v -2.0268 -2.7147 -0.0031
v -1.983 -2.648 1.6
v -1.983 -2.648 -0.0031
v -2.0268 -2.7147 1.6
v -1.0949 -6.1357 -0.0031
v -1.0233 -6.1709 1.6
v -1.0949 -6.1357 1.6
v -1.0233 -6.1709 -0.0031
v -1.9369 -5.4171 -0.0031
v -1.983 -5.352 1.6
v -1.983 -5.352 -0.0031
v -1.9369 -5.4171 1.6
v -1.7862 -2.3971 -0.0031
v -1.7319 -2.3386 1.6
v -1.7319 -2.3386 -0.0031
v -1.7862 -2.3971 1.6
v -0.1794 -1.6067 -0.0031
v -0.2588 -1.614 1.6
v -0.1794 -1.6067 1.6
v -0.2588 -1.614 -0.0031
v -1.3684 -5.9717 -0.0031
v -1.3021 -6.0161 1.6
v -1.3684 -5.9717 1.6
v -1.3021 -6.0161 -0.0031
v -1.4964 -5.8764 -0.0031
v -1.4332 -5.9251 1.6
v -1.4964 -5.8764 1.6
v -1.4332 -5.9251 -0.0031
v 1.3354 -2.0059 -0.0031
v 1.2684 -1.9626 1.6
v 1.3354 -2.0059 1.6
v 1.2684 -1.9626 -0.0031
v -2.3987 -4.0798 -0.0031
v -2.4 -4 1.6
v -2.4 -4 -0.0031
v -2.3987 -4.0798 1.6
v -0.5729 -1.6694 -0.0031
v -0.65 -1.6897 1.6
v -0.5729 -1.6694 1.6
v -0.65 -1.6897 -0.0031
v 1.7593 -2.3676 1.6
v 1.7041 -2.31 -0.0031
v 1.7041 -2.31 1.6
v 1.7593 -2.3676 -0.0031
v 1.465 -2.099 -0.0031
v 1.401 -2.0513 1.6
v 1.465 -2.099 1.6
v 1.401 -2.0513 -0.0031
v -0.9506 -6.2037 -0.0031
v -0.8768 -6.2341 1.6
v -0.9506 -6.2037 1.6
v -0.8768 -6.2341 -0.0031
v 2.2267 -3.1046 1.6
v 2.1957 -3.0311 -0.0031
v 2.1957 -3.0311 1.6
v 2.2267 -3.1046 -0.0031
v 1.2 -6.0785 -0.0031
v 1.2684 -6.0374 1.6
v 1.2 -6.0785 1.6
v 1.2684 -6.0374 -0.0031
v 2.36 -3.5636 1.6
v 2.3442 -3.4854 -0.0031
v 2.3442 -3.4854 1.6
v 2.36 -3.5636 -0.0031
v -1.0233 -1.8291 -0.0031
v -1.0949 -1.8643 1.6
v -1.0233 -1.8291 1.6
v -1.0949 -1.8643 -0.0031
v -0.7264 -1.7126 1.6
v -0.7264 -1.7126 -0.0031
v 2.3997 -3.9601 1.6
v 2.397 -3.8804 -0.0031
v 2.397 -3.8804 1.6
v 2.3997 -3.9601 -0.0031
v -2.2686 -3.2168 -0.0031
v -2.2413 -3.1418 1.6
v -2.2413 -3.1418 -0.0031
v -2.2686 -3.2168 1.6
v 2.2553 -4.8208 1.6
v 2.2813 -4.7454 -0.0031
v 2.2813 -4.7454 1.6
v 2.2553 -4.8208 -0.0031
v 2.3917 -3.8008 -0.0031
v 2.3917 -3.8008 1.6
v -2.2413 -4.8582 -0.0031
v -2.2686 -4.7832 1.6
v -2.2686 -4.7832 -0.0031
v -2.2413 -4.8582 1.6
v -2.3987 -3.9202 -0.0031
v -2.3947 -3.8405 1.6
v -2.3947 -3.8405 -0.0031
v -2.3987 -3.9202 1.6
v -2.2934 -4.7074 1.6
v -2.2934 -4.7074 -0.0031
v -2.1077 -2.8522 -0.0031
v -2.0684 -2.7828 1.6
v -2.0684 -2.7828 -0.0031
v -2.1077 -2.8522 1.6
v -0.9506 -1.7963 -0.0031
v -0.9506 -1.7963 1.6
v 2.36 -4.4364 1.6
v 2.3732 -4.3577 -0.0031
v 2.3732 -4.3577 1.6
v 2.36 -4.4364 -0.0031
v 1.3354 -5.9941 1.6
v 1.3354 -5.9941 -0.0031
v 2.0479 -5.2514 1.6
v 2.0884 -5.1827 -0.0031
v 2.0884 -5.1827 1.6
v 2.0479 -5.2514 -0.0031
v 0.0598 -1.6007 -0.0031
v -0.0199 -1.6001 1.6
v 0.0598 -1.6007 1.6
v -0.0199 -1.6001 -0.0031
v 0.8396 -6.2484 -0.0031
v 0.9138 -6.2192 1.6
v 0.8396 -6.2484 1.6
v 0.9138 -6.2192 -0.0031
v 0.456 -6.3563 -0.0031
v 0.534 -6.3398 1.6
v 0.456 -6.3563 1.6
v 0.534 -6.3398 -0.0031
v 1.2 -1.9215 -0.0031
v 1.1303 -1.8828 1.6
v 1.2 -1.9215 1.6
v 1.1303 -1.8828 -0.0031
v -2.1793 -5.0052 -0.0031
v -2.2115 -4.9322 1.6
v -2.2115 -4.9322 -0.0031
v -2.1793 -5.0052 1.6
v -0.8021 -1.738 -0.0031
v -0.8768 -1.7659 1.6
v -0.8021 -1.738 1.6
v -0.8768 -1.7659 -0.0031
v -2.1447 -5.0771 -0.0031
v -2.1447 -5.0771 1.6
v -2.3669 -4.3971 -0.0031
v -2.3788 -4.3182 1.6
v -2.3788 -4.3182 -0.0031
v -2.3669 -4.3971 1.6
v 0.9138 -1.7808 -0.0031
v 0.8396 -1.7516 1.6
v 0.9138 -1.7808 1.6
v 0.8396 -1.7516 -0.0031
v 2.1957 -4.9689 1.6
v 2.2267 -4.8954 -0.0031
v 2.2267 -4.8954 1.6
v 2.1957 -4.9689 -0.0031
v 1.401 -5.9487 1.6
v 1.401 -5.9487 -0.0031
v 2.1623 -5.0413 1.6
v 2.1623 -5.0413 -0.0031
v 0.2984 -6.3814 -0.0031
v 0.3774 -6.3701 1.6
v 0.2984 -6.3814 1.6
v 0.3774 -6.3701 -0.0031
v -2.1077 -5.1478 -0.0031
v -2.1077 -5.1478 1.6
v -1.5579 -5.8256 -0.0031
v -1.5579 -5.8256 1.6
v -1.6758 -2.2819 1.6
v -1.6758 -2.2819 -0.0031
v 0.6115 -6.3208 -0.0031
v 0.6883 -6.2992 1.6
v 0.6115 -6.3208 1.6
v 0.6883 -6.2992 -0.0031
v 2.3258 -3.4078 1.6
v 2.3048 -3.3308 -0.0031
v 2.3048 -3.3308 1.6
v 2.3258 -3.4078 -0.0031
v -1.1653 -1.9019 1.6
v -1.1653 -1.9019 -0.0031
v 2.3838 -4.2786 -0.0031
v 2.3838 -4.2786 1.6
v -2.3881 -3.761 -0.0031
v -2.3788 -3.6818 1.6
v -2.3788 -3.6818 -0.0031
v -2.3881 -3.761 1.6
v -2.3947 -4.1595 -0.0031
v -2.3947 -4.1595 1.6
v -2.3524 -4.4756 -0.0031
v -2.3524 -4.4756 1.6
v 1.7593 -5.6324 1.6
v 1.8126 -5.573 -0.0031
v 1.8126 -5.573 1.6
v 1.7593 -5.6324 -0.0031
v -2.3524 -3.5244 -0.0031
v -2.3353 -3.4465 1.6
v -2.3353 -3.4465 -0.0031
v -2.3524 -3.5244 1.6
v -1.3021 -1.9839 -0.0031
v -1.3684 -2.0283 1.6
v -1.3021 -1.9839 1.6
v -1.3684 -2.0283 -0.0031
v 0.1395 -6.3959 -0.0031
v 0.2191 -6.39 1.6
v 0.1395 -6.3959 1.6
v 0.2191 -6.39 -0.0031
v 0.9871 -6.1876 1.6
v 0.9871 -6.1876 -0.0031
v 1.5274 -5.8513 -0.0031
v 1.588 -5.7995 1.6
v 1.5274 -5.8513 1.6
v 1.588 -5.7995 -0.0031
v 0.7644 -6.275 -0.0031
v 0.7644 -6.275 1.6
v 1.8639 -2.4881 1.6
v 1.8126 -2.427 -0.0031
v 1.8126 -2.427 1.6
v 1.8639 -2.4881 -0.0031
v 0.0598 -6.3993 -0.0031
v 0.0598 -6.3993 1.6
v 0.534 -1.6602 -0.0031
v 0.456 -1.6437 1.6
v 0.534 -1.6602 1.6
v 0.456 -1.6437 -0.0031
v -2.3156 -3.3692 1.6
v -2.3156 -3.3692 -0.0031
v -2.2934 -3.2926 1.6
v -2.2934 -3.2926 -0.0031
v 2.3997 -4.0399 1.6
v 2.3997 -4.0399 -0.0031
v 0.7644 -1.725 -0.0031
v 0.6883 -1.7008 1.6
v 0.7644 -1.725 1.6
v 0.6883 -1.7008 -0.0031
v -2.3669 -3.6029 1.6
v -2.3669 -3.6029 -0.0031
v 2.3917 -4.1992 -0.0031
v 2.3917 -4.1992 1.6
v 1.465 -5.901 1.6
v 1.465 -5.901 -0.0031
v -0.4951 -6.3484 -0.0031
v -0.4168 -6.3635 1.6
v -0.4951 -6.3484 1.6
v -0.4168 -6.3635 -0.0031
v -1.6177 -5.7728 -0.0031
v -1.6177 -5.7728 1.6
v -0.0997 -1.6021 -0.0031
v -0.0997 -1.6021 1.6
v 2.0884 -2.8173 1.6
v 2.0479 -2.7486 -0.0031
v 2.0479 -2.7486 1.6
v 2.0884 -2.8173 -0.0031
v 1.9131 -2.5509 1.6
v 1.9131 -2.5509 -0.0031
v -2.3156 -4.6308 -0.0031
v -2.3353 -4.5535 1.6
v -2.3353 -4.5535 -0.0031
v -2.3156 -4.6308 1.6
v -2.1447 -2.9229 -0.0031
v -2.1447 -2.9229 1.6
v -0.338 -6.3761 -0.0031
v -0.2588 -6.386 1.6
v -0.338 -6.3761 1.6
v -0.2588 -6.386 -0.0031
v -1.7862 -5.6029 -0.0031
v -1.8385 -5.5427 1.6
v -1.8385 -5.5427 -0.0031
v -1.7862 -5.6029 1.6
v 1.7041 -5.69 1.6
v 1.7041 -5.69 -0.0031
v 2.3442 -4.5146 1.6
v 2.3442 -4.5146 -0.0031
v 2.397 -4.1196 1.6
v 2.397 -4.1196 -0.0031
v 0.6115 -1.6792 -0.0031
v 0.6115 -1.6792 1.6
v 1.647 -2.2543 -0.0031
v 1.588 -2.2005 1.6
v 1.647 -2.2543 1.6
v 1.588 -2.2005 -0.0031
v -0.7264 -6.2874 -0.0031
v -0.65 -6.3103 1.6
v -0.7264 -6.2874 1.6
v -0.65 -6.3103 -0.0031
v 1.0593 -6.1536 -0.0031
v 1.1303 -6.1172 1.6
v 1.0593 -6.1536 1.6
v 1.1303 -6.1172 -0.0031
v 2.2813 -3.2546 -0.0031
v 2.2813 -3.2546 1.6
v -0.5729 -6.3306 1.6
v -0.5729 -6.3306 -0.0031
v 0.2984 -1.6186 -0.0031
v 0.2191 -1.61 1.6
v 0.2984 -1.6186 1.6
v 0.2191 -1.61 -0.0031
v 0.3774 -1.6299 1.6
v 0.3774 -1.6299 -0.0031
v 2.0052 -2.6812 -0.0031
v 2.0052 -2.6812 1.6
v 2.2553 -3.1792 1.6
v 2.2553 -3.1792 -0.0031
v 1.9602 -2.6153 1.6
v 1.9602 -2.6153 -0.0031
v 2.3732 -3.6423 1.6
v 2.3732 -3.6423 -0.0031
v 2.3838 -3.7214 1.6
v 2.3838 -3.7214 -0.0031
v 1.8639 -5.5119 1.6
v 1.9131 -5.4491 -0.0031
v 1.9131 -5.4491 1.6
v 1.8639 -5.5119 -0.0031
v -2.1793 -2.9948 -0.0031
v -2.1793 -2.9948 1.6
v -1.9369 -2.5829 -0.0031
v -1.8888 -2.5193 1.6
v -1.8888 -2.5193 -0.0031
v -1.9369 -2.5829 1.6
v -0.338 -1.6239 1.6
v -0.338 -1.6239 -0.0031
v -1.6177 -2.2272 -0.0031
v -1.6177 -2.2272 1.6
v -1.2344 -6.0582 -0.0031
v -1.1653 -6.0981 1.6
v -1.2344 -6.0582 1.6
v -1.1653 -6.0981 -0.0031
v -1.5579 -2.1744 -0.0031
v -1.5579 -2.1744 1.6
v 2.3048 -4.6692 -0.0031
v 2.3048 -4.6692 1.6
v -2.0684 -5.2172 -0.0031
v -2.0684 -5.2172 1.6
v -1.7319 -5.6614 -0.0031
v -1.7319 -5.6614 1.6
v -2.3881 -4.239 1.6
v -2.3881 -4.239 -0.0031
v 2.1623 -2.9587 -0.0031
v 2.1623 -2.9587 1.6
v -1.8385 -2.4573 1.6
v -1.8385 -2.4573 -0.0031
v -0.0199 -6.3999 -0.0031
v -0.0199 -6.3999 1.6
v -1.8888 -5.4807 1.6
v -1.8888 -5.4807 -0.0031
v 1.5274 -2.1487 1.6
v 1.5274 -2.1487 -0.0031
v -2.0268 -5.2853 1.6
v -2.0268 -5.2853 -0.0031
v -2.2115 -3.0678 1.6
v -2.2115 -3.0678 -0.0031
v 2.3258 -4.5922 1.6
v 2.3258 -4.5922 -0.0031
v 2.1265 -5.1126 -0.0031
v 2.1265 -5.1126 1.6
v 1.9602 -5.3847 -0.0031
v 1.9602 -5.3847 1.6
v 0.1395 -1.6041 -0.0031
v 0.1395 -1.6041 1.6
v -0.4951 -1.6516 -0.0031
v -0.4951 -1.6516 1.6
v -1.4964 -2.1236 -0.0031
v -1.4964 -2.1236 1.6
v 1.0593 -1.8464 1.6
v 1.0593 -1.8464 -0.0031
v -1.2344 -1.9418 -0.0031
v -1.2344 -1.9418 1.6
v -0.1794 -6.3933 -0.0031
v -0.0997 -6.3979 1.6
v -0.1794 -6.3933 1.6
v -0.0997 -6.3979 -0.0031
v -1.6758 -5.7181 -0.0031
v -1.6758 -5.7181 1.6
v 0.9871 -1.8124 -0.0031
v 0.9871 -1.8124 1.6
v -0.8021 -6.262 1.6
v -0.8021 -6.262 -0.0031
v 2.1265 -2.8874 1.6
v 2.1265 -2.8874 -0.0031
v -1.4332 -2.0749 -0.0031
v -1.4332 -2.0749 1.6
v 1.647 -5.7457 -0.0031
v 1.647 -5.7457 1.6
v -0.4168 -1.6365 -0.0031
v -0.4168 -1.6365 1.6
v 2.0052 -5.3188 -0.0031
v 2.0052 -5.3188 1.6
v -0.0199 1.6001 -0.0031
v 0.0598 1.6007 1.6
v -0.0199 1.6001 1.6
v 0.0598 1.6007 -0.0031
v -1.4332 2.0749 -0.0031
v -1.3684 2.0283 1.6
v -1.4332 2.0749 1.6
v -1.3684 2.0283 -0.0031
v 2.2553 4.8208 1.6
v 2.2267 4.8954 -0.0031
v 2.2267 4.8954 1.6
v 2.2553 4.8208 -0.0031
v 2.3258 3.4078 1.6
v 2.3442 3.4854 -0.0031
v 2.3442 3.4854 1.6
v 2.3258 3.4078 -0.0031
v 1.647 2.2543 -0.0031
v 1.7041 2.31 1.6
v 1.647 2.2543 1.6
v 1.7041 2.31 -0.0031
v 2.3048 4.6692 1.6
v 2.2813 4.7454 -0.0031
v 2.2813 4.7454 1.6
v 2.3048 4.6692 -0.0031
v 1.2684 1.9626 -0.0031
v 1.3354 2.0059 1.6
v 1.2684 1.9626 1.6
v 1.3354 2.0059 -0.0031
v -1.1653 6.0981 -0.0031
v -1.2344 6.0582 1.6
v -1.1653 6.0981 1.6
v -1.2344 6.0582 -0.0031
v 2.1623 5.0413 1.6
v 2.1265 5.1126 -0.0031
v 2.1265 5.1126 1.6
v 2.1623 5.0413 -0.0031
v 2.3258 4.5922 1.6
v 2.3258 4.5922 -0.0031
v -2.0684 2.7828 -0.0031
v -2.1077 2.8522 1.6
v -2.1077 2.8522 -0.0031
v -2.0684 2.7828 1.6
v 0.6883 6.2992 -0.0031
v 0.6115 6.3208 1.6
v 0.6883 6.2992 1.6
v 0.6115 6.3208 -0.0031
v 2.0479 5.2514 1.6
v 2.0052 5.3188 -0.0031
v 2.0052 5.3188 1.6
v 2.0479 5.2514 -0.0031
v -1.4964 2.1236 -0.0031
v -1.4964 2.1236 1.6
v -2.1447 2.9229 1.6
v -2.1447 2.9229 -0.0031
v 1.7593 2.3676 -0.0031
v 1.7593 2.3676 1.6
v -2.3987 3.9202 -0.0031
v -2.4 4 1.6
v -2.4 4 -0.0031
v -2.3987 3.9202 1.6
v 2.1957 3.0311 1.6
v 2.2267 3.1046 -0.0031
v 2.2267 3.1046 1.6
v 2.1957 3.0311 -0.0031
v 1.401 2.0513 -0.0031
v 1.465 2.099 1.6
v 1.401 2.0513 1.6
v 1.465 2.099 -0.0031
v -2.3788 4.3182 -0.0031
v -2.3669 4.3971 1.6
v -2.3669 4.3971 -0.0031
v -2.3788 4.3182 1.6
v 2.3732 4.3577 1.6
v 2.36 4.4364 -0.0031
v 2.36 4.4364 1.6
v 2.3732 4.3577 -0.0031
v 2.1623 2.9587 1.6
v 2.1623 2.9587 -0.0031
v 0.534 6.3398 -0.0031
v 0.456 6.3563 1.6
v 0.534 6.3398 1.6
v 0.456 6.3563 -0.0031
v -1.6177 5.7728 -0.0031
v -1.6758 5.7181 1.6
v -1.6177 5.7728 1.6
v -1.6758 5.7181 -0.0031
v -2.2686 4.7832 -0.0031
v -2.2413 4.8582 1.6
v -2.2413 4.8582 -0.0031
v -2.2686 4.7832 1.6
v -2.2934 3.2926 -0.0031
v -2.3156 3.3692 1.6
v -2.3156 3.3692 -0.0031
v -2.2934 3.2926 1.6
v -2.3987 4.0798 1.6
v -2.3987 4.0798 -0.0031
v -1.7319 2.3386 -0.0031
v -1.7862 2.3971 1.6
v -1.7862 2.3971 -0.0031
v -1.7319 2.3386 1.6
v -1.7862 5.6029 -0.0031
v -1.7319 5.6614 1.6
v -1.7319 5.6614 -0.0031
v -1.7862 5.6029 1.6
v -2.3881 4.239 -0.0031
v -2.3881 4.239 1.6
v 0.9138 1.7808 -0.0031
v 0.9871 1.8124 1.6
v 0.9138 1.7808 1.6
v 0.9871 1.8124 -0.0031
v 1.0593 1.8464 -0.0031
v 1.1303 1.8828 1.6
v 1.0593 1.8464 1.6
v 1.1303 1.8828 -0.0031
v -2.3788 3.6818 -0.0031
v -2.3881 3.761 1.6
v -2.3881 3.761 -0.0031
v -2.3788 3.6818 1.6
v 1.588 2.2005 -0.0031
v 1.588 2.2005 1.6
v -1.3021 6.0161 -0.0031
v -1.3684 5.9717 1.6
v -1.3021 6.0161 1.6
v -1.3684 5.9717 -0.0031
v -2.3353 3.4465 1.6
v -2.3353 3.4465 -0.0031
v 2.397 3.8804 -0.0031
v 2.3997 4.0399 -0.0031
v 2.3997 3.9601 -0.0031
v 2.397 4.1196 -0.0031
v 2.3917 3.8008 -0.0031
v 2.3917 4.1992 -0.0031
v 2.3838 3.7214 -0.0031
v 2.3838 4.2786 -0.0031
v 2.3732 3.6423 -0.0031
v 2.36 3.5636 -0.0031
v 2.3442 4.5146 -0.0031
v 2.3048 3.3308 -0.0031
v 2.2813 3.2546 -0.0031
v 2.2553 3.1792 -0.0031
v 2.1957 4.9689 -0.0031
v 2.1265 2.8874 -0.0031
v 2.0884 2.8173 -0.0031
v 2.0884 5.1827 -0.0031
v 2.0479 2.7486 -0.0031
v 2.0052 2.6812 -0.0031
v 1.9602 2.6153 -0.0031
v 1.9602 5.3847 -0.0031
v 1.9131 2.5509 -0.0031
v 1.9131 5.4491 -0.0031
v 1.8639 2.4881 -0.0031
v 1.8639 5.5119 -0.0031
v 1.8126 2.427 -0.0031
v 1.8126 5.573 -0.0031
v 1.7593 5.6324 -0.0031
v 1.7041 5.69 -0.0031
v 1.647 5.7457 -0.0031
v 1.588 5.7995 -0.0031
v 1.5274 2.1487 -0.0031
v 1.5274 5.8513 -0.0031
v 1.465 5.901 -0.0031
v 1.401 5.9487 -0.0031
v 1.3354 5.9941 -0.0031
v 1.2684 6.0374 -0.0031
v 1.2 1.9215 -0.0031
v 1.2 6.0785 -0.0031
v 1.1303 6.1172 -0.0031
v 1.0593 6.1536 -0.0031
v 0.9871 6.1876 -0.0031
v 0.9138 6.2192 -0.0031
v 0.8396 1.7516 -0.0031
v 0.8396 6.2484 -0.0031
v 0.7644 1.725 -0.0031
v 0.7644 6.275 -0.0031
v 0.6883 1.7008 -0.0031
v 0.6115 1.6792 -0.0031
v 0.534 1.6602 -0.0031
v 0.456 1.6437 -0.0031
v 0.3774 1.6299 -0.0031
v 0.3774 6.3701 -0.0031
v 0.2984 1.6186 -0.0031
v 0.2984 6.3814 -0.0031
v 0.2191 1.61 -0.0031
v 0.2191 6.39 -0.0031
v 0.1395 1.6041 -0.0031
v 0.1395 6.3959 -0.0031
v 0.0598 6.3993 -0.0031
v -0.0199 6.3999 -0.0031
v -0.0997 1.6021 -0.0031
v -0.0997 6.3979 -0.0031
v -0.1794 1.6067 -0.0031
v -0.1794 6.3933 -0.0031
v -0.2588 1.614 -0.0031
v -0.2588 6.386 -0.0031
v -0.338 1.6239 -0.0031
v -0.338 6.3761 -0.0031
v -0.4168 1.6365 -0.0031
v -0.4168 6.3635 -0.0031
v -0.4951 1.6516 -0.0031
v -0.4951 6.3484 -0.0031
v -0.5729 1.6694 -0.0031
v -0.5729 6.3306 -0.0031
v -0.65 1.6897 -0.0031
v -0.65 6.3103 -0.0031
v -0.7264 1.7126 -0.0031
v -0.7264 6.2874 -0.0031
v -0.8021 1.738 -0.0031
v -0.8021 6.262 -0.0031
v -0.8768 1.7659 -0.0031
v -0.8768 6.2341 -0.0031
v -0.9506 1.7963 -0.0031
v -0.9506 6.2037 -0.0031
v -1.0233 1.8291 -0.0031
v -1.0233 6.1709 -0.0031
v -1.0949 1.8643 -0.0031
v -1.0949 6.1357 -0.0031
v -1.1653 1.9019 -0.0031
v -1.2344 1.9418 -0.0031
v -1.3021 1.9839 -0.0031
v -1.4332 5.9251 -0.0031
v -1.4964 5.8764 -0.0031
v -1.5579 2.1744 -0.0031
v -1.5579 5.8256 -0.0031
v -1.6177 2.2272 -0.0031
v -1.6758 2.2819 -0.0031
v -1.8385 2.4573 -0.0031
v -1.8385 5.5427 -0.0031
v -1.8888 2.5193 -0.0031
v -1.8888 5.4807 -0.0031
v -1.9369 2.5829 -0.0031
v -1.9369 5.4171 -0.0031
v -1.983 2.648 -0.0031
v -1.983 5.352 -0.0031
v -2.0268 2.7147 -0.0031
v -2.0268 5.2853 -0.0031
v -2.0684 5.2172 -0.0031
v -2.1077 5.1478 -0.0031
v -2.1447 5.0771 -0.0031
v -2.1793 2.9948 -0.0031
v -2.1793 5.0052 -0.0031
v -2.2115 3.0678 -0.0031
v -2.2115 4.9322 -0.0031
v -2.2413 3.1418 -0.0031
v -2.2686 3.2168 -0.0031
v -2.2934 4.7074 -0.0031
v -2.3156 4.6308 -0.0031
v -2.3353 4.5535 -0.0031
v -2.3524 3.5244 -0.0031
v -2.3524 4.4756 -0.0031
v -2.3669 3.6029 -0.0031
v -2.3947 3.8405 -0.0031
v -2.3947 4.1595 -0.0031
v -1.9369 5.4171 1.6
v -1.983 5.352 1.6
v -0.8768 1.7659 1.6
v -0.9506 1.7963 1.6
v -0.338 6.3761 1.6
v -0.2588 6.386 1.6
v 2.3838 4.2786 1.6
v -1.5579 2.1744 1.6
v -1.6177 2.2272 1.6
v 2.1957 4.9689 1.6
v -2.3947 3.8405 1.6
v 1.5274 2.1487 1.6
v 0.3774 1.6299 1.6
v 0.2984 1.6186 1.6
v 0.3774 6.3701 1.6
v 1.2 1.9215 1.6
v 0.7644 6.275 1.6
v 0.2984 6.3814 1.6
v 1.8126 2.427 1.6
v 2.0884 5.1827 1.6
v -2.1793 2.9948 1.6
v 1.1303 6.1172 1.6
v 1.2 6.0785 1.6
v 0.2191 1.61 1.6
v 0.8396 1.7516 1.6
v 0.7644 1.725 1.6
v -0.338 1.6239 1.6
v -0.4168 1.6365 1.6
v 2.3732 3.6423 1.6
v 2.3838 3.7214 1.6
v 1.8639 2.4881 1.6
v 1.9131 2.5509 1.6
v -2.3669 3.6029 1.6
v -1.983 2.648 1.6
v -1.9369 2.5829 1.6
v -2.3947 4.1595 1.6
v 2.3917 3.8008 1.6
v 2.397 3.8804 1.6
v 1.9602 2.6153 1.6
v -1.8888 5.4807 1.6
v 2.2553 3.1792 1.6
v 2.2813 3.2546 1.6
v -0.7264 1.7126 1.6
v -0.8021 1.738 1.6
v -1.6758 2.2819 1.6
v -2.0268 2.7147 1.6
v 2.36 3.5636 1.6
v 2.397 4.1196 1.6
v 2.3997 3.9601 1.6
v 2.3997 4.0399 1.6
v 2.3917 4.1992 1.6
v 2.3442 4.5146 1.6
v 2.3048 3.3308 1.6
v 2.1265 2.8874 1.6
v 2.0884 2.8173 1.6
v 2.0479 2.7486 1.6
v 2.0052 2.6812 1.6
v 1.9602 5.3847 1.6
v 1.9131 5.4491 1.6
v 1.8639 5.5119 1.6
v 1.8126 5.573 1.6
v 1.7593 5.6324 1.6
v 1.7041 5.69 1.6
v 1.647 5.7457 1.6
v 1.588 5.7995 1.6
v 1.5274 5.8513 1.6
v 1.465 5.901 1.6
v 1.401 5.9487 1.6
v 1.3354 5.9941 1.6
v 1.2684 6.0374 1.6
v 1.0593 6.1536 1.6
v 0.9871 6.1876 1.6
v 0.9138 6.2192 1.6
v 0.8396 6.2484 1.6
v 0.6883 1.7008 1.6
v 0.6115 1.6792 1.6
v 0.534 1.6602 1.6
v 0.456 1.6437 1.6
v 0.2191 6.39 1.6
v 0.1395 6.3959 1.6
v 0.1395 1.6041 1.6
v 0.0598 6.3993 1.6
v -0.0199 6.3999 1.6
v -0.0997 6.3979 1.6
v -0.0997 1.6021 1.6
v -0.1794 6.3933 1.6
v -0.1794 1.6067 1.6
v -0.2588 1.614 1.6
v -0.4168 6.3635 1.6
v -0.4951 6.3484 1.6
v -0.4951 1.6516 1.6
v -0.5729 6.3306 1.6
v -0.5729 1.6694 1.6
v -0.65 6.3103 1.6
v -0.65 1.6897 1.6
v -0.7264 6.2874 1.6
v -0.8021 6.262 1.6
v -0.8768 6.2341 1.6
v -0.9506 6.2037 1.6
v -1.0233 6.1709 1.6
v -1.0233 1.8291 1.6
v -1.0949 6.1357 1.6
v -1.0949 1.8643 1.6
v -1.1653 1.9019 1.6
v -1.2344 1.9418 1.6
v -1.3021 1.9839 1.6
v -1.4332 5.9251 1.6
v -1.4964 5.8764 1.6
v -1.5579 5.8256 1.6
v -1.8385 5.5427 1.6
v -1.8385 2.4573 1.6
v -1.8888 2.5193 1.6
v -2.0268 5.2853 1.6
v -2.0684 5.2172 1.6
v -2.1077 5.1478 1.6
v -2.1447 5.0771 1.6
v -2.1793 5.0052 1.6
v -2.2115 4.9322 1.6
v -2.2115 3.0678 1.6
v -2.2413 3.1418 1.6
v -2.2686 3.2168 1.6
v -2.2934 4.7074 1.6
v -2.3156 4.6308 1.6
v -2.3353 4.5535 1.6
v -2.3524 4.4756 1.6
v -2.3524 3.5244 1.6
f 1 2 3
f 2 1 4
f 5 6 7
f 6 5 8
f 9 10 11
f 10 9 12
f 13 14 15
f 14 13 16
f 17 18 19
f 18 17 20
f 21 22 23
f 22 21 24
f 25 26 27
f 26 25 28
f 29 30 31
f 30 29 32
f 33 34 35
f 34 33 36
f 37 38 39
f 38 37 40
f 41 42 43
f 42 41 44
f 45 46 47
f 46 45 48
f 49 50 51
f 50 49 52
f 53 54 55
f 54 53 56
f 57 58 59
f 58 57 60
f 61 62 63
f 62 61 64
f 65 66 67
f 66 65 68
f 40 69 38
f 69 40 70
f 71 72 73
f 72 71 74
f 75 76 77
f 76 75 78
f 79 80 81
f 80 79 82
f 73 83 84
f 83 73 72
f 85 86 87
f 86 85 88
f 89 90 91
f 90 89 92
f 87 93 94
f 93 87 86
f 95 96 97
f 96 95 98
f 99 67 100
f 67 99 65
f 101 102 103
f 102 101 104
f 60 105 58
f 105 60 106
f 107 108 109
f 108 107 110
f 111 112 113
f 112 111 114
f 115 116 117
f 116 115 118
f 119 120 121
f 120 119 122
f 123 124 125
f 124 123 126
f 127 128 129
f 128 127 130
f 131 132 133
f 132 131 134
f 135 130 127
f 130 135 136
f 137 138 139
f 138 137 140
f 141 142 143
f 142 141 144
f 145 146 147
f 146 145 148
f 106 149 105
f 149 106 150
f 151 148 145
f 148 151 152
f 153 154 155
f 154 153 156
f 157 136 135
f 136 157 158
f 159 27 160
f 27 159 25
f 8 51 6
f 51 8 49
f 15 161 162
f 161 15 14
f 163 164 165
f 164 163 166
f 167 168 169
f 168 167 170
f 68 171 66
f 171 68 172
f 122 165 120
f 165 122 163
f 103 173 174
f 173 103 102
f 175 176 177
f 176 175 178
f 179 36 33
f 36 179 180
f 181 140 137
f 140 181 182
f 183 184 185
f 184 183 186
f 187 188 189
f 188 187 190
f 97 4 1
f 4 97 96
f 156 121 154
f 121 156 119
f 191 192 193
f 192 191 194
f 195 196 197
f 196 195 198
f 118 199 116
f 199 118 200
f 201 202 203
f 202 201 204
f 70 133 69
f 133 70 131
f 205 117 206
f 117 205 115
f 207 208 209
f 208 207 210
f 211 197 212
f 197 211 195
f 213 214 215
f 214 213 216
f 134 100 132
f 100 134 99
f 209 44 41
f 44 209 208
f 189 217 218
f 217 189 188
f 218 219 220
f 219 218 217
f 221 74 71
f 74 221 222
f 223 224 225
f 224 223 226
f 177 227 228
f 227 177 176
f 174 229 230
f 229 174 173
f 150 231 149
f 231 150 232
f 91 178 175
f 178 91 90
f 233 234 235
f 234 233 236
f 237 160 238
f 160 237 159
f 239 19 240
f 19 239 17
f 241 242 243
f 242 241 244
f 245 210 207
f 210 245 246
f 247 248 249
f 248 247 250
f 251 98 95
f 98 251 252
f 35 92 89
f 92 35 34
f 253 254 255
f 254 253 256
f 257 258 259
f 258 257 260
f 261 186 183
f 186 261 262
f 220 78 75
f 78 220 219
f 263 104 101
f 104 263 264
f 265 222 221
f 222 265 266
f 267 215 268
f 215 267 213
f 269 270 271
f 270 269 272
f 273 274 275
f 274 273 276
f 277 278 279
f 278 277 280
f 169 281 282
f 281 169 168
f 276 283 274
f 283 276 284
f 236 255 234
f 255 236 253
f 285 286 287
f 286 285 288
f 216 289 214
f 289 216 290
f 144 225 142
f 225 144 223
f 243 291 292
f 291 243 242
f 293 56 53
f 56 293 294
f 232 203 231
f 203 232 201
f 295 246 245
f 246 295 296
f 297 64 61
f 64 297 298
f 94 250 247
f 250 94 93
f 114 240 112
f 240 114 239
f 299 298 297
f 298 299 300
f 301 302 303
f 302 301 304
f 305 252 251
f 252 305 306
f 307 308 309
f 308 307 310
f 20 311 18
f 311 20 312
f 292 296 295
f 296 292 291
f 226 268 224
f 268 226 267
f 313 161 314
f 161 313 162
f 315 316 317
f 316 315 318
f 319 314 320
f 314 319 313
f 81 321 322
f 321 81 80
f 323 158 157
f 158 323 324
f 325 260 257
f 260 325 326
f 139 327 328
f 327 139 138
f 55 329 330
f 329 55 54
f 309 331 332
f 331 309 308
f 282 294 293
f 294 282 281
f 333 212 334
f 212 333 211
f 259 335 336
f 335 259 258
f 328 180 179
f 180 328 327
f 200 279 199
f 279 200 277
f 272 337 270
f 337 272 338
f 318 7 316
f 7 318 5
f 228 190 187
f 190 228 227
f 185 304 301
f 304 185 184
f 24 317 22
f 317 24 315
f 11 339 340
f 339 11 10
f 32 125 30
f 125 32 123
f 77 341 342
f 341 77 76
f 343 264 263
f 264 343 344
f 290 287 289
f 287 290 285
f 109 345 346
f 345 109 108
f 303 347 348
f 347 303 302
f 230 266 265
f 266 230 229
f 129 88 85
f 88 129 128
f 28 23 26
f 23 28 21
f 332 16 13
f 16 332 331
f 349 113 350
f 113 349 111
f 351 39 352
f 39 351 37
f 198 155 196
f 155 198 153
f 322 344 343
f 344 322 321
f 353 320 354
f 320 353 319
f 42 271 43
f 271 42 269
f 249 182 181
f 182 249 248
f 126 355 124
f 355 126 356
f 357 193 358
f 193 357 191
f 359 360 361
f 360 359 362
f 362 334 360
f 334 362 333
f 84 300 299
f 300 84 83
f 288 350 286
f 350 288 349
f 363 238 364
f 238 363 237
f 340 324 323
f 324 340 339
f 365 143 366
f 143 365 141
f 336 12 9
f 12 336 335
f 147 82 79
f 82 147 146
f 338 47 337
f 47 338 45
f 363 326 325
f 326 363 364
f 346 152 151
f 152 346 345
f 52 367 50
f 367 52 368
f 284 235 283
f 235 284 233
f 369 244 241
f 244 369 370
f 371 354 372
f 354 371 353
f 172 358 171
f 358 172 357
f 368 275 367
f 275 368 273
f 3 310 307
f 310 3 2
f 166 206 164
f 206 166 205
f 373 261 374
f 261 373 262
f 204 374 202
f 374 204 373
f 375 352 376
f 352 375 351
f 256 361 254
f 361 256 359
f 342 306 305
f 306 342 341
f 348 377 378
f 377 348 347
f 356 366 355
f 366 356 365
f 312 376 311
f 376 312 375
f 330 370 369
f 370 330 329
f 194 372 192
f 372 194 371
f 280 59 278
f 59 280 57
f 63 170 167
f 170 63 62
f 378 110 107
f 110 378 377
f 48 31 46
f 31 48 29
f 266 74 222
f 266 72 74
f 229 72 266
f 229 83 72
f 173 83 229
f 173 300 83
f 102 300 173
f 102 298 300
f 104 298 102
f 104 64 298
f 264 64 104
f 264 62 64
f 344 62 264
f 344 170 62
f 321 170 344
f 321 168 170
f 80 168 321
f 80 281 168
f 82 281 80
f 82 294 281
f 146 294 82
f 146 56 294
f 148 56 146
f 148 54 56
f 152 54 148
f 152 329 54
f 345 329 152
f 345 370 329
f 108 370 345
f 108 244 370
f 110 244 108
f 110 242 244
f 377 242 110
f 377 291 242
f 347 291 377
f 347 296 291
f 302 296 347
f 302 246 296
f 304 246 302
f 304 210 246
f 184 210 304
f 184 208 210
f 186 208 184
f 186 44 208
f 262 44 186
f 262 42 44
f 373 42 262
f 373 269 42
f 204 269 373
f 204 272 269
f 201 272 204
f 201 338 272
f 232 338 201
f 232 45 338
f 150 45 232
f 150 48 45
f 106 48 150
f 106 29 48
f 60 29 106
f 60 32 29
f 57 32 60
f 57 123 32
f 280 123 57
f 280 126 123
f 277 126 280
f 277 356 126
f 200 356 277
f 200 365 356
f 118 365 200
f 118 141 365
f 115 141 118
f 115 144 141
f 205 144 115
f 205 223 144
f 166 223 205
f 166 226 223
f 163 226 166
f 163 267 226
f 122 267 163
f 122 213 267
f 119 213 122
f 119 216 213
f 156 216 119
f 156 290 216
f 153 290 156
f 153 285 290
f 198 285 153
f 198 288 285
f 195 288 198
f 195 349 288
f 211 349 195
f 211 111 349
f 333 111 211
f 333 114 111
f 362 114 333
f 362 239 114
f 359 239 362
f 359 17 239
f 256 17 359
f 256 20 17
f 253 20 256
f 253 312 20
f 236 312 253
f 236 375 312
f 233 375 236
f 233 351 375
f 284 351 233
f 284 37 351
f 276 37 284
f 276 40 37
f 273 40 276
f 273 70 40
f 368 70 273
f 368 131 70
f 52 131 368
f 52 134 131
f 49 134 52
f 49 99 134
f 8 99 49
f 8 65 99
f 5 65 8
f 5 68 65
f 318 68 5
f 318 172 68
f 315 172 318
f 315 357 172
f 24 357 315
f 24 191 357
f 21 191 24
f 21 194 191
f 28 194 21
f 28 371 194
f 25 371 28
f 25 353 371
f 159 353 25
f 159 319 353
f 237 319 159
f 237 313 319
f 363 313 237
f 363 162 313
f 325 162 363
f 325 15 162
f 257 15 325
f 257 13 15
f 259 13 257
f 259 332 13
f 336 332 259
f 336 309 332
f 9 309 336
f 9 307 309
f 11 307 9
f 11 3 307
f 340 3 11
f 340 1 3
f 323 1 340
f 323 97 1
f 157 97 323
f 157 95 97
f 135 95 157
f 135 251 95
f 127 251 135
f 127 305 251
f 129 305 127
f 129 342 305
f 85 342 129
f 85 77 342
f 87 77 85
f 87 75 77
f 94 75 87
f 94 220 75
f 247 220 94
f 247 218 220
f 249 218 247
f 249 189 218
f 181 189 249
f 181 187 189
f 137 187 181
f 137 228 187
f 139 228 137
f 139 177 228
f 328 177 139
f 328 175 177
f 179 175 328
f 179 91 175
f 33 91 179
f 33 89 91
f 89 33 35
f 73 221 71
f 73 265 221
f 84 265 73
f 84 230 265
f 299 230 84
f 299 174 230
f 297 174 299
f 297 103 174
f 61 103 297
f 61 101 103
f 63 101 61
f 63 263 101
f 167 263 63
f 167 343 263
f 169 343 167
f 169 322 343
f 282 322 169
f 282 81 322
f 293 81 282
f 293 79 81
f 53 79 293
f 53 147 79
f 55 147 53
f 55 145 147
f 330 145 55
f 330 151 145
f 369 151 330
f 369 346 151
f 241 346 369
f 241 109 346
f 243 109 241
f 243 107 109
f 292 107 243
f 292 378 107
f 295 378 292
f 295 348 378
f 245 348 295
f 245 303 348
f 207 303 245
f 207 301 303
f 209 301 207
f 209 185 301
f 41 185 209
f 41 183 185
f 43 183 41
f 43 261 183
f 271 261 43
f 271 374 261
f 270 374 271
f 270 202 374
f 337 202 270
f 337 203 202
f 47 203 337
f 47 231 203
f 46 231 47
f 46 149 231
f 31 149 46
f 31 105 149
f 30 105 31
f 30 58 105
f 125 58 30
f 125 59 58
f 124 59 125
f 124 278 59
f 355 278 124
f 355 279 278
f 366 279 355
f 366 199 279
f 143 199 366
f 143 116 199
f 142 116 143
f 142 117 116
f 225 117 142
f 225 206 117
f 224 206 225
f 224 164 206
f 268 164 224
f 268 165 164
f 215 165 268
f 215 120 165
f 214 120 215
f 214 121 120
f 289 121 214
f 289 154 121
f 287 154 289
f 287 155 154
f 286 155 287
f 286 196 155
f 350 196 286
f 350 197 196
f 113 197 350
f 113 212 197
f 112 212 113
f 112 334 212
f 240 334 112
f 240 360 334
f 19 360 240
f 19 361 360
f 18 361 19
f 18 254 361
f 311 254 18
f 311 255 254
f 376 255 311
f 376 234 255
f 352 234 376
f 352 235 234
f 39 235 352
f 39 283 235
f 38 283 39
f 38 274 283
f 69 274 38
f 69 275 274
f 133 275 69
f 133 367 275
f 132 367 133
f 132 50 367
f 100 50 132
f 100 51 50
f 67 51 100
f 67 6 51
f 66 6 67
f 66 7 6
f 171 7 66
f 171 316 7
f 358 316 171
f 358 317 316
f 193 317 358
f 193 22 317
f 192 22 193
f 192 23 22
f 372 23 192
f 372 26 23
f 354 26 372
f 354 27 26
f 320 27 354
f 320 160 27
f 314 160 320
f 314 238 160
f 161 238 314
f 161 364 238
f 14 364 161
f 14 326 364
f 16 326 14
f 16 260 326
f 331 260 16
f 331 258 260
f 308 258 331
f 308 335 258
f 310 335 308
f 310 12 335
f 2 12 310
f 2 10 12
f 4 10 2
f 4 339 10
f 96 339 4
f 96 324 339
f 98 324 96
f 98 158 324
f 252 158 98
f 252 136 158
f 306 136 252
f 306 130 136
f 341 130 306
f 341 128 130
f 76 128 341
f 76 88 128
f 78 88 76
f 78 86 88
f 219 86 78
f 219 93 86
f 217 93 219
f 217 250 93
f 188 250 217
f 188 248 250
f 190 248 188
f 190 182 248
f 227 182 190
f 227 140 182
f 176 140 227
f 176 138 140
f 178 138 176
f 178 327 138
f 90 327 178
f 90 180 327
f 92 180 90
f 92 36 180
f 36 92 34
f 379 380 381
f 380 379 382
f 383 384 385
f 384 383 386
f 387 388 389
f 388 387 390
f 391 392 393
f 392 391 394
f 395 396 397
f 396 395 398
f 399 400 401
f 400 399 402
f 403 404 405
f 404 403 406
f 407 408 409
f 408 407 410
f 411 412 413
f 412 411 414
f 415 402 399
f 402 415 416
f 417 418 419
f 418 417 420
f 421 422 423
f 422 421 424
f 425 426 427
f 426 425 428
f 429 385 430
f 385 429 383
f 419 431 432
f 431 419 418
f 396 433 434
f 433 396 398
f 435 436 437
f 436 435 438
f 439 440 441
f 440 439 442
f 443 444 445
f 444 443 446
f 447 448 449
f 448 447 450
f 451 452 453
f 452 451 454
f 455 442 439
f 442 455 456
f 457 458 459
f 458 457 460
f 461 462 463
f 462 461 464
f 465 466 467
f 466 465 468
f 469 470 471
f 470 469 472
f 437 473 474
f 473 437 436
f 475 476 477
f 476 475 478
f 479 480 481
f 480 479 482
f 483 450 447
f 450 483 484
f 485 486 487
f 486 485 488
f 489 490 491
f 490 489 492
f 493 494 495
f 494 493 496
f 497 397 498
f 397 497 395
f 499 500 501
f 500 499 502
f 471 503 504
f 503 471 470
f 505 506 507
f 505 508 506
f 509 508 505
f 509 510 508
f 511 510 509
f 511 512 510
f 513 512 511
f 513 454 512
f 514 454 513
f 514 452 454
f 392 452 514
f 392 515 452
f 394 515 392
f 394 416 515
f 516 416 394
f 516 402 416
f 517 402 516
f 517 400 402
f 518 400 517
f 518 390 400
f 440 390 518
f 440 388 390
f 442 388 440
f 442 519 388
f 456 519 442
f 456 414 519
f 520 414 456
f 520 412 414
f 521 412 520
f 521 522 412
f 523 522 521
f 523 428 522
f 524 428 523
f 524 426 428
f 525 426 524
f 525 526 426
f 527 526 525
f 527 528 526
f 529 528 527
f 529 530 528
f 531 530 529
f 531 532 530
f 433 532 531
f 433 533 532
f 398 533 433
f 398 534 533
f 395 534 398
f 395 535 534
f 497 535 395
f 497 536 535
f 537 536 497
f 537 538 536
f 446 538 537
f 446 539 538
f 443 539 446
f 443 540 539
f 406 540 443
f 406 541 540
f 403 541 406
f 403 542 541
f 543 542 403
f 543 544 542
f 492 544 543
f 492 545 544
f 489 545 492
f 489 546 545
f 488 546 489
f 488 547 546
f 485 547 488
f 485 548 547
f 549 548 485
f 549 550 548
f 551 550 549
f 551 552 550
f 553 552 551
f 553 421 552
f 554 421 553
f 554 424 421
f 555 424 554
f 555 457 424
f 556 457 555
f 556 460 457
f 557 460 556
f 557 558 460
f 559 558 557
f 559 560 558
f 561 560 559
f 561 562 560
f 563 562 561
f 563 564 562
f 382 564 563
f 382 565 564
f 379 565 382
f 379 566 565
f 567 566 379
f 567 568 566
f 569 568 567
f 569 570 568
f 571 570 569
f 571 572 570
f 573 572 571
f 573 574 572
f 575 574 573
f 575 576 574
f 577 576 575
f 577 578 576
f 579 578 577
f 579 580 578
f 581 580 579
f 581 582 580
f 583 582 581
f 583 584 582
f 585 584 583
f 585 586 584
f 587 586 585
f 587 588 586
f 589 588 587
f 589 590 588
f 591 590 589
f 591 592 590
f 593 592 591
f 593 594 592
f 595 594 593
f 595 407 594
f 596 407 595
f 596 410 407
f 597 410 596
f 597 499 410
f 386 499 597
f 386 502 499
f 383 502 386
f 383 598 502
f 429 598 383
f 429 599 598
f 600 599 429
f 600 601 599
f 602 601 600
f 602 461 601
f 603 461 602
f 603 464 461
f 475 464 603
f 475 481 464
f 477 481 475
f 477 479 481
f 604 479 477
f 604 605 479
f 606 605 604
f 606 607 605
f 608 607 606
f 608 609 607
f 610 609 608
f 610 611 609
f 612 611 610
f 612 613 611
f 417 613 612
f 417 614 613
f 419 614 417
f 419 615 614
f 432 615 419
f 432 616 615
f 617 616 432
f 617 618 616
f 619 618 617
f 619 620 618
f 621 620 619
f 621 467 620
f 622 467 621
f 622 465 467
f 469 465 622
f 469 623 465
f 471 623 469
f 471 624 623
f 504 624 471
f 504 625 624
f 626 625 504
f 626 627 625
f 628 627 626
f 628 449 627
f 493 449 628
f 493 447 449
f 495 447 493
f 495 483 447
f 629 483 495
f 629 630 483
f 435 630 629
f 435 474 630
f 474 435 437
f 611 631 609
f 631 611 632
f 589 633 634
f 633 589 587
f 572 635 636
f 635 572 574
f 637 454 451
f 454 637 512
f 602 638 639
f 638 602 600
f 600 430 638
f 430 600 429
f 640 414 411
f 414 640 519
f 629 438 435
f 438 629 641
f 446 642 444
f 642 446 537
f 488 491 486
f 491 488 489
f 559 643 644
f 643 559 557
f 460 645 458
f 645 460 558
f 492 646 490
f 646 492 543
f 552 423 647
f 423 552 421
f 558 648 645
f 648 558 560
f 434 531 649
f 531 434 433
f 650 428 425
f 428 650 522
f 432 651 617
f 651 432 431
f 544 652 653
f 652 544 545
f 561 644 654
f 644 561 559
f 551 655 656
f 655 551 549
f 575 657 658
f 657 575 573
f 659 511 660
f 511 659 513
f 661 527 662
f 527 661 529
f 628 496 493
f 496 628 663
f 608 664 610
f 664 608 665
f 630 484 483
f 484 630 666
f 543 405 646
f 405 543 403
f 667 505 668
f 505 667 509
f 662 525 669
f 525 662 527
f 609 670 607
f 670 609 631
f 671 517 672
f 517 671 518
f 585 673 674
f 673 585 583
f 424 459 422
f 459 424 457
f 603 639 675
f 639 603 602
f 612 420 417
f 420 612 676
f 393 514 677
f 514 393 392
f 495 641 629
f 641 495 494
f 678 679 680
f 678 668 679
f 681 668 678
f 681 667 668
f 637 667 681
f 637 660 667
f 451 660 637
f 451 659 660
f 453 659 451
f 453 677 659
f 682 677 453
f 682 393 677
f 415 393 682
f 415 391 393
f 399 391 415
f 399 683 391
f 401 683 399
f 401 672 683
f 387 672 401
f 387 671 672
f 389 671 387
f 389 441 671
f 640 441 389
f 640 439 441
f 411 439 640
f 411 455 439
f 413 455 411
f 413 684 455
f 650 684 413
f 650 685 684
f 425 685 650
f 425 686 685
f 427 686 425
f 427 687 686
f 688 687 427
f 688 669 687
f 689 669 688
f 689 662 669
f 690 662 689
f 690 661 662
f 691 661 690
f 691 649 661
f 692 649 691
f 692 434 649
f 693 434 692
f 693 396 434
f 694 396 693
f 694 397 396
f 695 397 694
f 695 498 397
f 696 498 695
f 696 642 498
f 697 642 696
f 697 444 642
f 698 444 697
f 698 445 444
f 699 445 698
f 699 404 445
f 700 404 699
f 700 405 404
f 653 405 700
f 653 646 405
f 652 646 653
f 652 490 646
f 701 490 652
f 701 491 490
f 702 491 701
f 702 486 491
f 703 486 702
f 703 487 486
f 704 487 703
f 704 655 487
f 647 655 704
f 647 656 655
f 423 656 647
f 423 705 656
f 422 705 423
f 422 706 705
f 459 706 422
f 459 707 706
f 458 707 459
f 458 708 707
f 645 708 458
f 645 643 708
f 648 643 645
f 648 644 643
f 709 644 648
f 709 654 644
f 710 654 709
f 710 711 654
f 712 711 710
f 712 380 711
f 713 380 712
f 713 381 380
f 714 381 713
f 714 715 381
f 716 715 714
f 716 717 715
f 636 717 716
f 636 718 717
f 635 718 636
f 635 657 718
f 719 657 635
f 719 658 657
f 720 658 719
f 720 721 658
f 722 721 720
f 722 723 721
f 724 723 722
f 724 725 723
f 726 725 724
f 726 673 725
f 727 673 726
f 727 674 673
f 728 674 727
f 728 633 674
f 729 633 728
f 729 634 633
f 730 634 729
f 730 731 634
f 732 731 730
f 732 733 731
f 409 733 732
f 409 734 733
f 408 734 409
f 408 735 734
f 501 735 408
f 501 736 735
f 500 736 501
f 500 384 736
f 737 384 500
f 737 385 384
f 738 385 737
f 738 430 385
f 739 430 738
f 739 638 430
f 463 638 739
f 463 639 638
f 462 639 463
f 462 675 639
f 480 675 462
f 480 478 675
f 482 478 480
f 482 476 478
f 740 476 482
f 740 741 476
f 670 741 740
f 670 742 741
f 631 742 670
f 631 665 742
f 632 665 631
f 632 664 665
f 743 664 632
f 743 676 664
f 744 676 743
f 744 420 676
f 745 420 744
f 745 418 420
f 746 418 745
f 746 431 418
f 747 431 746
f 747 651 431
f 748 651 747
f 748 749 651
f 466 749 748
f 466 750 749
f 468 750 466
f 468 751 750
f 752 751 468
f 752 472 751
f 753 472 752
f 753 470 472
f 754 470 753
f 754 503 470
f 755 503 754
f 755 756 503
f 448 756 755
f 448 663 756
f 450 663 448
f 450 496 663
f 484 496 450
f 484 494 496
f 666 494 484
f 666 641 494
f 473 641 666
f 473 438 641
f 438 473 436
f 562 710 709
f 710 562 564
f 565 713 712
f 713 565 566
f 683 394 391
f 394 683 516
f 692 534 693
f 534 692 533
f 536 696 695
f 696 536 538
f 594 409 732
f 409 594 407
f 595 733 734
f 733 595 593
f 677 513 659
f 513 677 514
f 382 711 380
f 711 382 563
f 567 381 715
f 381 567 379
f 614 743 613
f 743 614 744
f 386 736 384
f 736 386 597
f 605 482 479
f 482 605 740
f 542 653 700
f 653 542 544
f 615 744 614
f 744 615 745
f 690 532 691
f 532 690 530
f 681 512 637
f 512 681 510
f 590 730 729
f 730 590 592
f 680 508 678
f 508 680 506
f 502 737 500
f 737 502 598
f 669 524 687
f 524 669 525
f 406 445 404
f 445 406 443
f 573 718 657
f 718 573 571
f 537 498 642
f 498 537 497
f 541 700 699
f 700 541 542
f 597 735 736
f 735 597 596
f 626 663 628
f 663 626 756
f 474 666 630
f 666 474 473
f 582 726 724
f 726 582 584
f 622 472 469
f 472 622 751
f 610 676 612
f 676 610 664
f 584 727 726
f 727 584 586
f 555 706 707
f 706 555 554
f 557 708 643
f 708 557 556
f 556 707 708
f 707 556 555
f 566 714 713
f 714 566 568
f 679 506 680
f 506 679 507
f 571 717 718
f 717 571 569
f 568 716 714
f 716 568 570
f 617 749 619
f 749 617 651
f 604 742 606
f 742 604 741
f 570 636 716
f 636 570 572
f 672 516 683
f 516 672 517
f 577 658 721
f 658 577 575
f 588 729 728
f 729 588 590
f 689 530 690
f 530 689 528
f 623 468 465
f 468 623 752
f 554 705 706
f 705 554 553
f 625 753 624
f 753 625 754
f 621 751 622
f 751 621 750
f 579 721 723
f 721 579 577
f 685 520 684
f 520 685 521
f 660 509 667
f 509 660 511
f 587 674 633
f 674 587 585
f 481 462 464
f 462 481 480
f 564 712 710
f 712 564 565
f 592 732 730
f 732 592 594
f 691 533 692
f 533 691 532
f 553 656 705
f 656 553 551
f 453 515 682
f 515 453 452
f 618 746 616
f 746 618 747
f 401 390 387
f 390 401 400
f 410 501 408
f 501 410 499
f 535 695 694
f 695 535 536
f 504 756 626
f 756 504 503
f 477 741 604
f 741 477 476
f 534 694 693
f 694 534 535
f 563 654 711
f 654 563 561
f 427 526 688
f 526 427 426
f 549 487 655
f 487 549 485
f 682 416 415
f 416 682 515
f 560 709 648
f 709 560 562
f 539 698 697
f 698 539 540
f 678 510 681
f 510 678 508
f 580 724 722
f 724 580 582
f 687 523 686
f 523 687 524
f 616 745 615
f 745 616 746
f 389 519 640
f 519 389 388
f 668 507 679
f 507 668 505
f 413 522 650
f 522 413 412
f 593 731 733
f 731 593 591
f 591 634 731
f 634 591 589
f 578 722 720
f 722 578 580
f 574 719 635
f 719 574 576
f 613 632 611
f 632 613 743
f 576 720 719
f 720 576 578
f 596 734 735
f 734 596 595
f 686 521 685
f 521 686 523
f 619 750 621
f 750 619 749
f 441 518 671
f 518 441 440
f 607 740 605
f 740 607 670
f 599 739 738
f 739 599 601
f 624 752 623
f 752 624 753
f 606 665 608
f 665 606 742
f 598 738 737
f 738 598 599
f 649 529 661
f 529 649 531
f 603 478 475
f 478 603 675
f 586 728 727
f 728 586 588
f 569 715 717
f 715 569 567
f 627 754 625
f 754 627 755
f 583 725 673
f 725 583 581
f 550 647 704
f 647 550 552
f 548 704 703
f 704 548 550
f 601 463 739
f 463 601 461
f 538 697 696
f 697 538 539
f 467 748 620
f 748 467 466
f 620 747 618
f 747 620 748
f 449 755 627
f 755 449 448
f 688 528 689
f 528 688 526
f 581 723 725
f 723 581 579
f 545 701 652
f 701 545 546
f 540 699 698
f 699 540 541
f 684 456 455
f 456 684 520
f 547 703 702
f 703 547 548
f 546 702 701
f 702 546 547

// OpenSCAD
use <../lib.scad>
use <42022.scad>
$fa=1; $fs=0.2;
function ldraw_lib__464(realsolid=false) = [
// 0 ~Moved to 42022
// 0 Name: 464.dat
// 0 Author: [PTadmin]
// 0 !LDRAW_ORG Part UPDATE 2009-01
// 0 !LICENSE Licensed under CC BY 4.0 : see CAreadme.txt
// 
// 0 BFC CERTIFY CCW
  [0,"BFC","CERTIFY"],
  [0,"BFC","CCW"],
// 
// 0 !HISTORY 2009-05-02 [PTadmin] Official Update 2009-01
// 
// 
// 0 // Slope Brick Round 1 x 6
// 
// 1 16 0 0 0 1 0 0 0 1 0 0 0 1 42022.dat
  [1,16,0,0,0,1,0,0,0,1,0,0,0,1, ldraw_lib__42022(realsolid)],
];
module ldraw_lib__464(step=0, col=false, unit=2/5, alt=false, line=0.2, solid=!$preview)
    makepoly(ldraw_lib__464(solid), step=step, col=col, unit=unit, alt=alt, line=line, solid=solid);
ldraw_lib__464(line=0.2);
